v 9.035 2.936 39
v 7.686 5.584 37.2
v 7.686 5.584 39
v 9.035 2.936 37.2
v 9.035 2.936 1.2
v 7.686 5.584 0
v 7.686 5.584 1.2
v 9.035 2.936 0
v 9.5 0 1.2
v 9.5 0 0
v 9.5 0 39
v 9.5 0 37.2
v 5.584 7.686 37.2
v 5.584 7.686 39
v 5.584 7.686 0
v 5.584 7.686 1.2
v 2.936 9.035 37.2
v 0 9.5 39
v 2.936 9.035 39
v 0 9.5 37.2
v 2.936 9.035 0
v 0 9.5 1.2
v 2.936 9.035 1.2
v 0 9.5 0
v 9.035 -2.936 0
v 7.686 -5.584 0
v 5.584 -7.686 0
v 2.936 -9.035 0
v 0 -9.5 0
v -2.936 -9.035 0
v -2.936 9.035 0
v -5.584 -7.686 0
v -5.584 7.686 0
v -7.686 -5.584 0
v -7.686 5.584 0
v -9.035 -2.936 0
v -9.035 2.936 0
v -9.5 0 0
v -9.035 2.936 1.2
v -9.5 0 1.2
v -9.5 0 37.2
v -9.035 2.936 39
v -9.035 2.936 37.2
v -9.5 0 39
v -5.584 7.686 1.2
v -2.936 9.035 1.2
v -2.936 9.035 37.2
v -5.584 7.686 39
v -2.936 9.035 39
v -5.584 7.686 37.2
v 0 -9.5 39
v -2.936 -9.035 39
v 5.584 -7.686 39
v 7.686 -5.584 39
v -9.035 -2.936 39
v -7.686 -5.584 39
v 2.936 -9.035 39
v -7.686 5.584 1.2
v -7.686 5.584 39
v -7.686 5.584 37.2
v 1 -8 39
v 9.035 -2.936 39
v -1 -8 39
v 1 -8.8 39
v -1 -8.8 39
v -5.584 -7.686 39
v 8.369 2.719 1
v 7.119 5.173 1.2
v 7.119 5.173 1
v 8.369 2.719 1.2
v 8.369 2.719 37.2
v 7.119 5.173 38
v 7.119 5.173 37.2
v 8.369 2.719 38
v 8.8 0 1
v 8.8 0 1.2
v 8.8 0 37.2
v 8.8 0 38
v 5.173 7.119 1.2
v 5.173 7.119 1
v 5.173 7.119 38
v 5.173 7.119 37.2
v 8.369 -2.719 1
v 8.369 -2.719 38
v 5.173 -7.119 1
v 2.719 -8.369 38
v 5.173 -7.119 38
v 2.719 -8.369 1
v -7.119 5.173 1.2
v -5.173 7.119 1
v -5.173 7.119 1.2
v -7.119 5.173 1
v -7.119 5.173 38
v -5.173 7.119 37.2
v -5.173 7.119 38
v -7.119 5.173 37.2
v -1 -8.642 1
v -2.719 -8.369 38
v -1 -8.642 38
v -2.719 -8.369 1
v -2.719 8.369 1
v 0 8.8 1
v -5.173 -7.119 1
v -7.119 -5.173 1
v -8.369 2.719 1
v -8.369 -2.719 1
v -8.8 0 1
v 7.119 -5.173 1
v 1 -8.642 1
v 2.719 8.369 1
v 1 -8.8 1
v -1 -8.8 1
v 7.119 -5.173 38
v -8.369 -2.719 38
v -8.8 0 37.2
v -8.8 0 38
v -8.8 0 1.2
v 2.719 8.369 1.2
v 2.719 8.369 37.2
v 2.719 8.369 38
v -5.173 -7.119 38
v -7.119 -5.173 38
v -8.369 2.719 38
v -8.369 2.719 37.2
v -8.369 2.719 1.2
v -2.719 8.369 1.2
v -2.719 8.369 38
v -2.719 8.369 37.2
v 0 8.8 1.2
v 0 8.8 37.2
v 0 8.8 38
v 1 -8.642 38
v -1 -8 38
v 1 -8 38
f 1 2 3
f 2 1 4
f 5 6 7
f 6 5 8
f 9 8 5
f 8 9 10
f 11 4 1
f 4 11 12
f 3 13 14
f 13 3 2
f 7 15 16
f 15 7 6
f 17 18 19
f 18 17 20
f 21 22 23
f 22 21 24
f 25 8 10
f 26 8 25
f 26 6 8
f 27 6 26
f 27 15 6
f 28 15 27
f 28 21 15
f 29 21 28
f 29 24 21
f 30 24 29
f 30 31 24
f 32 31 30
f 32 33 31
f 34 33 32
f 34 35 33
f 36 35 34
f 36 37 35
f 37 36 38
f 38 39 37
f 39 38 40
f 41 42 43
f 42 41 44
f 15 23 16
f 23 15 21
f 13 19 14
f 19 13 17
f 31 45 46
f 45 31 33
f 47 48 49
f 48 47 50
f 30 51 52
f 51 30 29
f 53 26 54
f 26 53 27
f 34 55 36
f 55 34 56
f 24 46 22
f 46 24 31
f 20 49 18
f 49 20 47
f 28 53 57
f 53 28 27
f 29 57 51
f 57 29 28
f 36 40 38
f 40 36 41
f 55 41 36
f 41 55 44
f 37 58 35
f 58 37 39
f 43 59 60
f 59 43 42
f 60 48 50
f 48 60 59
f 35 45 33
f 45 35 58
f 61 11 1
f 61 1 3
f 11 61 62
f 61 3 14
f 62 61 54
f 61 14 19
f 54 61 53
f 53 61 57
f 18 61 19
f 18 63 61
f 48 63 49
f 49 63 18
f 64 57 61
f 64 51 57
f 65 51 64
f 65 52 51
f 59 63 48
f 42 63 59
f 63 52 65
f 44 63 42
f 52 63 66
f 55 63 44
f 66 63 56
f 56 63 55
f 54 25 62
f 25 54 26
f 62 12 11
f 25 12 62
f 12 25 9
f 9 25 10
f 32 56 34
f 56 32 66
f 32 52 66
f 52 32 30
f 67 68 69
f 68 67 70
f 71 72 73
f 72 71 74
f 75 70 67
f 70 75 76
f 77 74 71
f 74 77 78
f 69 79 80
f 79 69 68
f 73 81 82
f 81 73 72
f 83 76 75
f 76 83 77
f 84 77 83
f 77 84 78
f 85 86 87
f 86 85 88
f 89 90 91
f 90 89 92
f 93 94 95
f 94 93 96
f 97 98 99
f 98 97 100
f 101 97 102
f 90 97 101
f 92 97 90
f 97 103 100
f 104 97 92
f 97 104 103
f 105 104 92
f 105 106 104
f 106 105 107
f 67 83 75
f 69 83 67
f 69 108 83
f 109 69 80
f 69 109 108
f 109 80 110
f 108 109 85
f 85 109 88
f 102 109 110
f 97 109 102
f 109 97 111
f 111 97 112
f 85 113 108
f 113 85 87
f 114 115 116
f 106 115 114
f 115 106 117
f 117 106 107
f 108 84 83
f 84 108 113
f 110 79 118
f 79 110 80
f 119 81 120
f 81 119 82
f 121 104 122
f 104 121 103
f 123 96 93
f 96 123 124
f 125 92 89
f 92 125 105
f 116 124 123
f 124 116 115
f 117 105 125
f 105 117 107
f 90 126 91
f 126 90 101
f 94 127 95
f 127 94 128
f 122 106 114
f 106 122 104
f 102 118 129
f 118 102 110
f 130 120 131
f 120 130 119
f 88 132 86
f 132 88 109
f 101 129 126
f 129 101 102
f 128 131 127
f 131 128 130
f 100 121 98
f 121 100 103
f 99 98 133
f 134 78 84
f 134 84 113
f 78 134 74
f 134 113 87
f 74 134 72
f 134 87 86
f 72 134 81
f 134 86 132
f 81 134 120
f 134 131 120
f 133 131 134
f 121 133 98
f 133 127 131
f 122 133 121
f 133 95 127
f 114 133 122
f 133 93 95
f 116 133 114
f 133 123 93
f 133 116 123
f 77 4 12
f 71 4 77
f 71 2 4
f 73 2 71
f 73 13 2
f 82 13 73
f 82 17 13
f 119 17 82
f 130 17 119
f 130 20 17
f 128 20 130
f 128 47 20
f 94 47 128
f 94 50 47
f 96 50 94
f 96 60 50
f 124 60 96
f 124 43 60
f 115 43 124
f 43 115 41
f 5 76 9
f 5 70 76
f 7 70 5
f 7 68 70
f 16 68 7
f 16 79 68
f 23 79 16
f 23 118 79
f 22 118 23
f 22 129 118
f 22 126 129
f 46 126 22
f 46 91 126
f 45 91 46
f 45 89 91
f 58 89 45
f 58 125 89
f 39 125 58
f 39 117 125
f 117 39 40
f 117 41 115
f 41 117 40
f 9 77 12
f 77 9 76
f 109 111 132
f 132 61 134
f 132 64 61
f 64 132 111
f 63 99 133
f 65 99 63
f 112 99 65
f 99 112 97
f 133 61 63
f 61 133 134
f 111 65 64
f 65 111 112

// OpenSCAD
// INPUTS #############################

$fn = 20;

// MODULES ############################
// HELPERS ############################
// GLOBAL PARAMETERS ##################

function d_ext() = 19;
function d_batterie() = 17.6;
function h_base_batterie() = 39;
function h_batterie() = 37;
function h_ouv_batterie() = h_batterie() - 1;

// BASE ###############################

difference() {
    union() {
        cylinder(d=d_ext(), h=h_base_batterie()); // base de la batterie
        //
        //
    }
    translate([0,0,1])
    cylinder(d=d_batterie(), h=h_batterie()); // emplacement de la batterie
    translate([(d_ext()+0.1)/-2,0,1.2])
    cube([d_ext()+0.1,d_ext()/2,h_ouv_batterie()]); // ouverture pour insérer la batterie
    translate([-1,d_batterie()/-2,1])
    cube([2,0.8,h_batterie()+10]); // gouttière pole nég. de la batterie
    //
    //
}
